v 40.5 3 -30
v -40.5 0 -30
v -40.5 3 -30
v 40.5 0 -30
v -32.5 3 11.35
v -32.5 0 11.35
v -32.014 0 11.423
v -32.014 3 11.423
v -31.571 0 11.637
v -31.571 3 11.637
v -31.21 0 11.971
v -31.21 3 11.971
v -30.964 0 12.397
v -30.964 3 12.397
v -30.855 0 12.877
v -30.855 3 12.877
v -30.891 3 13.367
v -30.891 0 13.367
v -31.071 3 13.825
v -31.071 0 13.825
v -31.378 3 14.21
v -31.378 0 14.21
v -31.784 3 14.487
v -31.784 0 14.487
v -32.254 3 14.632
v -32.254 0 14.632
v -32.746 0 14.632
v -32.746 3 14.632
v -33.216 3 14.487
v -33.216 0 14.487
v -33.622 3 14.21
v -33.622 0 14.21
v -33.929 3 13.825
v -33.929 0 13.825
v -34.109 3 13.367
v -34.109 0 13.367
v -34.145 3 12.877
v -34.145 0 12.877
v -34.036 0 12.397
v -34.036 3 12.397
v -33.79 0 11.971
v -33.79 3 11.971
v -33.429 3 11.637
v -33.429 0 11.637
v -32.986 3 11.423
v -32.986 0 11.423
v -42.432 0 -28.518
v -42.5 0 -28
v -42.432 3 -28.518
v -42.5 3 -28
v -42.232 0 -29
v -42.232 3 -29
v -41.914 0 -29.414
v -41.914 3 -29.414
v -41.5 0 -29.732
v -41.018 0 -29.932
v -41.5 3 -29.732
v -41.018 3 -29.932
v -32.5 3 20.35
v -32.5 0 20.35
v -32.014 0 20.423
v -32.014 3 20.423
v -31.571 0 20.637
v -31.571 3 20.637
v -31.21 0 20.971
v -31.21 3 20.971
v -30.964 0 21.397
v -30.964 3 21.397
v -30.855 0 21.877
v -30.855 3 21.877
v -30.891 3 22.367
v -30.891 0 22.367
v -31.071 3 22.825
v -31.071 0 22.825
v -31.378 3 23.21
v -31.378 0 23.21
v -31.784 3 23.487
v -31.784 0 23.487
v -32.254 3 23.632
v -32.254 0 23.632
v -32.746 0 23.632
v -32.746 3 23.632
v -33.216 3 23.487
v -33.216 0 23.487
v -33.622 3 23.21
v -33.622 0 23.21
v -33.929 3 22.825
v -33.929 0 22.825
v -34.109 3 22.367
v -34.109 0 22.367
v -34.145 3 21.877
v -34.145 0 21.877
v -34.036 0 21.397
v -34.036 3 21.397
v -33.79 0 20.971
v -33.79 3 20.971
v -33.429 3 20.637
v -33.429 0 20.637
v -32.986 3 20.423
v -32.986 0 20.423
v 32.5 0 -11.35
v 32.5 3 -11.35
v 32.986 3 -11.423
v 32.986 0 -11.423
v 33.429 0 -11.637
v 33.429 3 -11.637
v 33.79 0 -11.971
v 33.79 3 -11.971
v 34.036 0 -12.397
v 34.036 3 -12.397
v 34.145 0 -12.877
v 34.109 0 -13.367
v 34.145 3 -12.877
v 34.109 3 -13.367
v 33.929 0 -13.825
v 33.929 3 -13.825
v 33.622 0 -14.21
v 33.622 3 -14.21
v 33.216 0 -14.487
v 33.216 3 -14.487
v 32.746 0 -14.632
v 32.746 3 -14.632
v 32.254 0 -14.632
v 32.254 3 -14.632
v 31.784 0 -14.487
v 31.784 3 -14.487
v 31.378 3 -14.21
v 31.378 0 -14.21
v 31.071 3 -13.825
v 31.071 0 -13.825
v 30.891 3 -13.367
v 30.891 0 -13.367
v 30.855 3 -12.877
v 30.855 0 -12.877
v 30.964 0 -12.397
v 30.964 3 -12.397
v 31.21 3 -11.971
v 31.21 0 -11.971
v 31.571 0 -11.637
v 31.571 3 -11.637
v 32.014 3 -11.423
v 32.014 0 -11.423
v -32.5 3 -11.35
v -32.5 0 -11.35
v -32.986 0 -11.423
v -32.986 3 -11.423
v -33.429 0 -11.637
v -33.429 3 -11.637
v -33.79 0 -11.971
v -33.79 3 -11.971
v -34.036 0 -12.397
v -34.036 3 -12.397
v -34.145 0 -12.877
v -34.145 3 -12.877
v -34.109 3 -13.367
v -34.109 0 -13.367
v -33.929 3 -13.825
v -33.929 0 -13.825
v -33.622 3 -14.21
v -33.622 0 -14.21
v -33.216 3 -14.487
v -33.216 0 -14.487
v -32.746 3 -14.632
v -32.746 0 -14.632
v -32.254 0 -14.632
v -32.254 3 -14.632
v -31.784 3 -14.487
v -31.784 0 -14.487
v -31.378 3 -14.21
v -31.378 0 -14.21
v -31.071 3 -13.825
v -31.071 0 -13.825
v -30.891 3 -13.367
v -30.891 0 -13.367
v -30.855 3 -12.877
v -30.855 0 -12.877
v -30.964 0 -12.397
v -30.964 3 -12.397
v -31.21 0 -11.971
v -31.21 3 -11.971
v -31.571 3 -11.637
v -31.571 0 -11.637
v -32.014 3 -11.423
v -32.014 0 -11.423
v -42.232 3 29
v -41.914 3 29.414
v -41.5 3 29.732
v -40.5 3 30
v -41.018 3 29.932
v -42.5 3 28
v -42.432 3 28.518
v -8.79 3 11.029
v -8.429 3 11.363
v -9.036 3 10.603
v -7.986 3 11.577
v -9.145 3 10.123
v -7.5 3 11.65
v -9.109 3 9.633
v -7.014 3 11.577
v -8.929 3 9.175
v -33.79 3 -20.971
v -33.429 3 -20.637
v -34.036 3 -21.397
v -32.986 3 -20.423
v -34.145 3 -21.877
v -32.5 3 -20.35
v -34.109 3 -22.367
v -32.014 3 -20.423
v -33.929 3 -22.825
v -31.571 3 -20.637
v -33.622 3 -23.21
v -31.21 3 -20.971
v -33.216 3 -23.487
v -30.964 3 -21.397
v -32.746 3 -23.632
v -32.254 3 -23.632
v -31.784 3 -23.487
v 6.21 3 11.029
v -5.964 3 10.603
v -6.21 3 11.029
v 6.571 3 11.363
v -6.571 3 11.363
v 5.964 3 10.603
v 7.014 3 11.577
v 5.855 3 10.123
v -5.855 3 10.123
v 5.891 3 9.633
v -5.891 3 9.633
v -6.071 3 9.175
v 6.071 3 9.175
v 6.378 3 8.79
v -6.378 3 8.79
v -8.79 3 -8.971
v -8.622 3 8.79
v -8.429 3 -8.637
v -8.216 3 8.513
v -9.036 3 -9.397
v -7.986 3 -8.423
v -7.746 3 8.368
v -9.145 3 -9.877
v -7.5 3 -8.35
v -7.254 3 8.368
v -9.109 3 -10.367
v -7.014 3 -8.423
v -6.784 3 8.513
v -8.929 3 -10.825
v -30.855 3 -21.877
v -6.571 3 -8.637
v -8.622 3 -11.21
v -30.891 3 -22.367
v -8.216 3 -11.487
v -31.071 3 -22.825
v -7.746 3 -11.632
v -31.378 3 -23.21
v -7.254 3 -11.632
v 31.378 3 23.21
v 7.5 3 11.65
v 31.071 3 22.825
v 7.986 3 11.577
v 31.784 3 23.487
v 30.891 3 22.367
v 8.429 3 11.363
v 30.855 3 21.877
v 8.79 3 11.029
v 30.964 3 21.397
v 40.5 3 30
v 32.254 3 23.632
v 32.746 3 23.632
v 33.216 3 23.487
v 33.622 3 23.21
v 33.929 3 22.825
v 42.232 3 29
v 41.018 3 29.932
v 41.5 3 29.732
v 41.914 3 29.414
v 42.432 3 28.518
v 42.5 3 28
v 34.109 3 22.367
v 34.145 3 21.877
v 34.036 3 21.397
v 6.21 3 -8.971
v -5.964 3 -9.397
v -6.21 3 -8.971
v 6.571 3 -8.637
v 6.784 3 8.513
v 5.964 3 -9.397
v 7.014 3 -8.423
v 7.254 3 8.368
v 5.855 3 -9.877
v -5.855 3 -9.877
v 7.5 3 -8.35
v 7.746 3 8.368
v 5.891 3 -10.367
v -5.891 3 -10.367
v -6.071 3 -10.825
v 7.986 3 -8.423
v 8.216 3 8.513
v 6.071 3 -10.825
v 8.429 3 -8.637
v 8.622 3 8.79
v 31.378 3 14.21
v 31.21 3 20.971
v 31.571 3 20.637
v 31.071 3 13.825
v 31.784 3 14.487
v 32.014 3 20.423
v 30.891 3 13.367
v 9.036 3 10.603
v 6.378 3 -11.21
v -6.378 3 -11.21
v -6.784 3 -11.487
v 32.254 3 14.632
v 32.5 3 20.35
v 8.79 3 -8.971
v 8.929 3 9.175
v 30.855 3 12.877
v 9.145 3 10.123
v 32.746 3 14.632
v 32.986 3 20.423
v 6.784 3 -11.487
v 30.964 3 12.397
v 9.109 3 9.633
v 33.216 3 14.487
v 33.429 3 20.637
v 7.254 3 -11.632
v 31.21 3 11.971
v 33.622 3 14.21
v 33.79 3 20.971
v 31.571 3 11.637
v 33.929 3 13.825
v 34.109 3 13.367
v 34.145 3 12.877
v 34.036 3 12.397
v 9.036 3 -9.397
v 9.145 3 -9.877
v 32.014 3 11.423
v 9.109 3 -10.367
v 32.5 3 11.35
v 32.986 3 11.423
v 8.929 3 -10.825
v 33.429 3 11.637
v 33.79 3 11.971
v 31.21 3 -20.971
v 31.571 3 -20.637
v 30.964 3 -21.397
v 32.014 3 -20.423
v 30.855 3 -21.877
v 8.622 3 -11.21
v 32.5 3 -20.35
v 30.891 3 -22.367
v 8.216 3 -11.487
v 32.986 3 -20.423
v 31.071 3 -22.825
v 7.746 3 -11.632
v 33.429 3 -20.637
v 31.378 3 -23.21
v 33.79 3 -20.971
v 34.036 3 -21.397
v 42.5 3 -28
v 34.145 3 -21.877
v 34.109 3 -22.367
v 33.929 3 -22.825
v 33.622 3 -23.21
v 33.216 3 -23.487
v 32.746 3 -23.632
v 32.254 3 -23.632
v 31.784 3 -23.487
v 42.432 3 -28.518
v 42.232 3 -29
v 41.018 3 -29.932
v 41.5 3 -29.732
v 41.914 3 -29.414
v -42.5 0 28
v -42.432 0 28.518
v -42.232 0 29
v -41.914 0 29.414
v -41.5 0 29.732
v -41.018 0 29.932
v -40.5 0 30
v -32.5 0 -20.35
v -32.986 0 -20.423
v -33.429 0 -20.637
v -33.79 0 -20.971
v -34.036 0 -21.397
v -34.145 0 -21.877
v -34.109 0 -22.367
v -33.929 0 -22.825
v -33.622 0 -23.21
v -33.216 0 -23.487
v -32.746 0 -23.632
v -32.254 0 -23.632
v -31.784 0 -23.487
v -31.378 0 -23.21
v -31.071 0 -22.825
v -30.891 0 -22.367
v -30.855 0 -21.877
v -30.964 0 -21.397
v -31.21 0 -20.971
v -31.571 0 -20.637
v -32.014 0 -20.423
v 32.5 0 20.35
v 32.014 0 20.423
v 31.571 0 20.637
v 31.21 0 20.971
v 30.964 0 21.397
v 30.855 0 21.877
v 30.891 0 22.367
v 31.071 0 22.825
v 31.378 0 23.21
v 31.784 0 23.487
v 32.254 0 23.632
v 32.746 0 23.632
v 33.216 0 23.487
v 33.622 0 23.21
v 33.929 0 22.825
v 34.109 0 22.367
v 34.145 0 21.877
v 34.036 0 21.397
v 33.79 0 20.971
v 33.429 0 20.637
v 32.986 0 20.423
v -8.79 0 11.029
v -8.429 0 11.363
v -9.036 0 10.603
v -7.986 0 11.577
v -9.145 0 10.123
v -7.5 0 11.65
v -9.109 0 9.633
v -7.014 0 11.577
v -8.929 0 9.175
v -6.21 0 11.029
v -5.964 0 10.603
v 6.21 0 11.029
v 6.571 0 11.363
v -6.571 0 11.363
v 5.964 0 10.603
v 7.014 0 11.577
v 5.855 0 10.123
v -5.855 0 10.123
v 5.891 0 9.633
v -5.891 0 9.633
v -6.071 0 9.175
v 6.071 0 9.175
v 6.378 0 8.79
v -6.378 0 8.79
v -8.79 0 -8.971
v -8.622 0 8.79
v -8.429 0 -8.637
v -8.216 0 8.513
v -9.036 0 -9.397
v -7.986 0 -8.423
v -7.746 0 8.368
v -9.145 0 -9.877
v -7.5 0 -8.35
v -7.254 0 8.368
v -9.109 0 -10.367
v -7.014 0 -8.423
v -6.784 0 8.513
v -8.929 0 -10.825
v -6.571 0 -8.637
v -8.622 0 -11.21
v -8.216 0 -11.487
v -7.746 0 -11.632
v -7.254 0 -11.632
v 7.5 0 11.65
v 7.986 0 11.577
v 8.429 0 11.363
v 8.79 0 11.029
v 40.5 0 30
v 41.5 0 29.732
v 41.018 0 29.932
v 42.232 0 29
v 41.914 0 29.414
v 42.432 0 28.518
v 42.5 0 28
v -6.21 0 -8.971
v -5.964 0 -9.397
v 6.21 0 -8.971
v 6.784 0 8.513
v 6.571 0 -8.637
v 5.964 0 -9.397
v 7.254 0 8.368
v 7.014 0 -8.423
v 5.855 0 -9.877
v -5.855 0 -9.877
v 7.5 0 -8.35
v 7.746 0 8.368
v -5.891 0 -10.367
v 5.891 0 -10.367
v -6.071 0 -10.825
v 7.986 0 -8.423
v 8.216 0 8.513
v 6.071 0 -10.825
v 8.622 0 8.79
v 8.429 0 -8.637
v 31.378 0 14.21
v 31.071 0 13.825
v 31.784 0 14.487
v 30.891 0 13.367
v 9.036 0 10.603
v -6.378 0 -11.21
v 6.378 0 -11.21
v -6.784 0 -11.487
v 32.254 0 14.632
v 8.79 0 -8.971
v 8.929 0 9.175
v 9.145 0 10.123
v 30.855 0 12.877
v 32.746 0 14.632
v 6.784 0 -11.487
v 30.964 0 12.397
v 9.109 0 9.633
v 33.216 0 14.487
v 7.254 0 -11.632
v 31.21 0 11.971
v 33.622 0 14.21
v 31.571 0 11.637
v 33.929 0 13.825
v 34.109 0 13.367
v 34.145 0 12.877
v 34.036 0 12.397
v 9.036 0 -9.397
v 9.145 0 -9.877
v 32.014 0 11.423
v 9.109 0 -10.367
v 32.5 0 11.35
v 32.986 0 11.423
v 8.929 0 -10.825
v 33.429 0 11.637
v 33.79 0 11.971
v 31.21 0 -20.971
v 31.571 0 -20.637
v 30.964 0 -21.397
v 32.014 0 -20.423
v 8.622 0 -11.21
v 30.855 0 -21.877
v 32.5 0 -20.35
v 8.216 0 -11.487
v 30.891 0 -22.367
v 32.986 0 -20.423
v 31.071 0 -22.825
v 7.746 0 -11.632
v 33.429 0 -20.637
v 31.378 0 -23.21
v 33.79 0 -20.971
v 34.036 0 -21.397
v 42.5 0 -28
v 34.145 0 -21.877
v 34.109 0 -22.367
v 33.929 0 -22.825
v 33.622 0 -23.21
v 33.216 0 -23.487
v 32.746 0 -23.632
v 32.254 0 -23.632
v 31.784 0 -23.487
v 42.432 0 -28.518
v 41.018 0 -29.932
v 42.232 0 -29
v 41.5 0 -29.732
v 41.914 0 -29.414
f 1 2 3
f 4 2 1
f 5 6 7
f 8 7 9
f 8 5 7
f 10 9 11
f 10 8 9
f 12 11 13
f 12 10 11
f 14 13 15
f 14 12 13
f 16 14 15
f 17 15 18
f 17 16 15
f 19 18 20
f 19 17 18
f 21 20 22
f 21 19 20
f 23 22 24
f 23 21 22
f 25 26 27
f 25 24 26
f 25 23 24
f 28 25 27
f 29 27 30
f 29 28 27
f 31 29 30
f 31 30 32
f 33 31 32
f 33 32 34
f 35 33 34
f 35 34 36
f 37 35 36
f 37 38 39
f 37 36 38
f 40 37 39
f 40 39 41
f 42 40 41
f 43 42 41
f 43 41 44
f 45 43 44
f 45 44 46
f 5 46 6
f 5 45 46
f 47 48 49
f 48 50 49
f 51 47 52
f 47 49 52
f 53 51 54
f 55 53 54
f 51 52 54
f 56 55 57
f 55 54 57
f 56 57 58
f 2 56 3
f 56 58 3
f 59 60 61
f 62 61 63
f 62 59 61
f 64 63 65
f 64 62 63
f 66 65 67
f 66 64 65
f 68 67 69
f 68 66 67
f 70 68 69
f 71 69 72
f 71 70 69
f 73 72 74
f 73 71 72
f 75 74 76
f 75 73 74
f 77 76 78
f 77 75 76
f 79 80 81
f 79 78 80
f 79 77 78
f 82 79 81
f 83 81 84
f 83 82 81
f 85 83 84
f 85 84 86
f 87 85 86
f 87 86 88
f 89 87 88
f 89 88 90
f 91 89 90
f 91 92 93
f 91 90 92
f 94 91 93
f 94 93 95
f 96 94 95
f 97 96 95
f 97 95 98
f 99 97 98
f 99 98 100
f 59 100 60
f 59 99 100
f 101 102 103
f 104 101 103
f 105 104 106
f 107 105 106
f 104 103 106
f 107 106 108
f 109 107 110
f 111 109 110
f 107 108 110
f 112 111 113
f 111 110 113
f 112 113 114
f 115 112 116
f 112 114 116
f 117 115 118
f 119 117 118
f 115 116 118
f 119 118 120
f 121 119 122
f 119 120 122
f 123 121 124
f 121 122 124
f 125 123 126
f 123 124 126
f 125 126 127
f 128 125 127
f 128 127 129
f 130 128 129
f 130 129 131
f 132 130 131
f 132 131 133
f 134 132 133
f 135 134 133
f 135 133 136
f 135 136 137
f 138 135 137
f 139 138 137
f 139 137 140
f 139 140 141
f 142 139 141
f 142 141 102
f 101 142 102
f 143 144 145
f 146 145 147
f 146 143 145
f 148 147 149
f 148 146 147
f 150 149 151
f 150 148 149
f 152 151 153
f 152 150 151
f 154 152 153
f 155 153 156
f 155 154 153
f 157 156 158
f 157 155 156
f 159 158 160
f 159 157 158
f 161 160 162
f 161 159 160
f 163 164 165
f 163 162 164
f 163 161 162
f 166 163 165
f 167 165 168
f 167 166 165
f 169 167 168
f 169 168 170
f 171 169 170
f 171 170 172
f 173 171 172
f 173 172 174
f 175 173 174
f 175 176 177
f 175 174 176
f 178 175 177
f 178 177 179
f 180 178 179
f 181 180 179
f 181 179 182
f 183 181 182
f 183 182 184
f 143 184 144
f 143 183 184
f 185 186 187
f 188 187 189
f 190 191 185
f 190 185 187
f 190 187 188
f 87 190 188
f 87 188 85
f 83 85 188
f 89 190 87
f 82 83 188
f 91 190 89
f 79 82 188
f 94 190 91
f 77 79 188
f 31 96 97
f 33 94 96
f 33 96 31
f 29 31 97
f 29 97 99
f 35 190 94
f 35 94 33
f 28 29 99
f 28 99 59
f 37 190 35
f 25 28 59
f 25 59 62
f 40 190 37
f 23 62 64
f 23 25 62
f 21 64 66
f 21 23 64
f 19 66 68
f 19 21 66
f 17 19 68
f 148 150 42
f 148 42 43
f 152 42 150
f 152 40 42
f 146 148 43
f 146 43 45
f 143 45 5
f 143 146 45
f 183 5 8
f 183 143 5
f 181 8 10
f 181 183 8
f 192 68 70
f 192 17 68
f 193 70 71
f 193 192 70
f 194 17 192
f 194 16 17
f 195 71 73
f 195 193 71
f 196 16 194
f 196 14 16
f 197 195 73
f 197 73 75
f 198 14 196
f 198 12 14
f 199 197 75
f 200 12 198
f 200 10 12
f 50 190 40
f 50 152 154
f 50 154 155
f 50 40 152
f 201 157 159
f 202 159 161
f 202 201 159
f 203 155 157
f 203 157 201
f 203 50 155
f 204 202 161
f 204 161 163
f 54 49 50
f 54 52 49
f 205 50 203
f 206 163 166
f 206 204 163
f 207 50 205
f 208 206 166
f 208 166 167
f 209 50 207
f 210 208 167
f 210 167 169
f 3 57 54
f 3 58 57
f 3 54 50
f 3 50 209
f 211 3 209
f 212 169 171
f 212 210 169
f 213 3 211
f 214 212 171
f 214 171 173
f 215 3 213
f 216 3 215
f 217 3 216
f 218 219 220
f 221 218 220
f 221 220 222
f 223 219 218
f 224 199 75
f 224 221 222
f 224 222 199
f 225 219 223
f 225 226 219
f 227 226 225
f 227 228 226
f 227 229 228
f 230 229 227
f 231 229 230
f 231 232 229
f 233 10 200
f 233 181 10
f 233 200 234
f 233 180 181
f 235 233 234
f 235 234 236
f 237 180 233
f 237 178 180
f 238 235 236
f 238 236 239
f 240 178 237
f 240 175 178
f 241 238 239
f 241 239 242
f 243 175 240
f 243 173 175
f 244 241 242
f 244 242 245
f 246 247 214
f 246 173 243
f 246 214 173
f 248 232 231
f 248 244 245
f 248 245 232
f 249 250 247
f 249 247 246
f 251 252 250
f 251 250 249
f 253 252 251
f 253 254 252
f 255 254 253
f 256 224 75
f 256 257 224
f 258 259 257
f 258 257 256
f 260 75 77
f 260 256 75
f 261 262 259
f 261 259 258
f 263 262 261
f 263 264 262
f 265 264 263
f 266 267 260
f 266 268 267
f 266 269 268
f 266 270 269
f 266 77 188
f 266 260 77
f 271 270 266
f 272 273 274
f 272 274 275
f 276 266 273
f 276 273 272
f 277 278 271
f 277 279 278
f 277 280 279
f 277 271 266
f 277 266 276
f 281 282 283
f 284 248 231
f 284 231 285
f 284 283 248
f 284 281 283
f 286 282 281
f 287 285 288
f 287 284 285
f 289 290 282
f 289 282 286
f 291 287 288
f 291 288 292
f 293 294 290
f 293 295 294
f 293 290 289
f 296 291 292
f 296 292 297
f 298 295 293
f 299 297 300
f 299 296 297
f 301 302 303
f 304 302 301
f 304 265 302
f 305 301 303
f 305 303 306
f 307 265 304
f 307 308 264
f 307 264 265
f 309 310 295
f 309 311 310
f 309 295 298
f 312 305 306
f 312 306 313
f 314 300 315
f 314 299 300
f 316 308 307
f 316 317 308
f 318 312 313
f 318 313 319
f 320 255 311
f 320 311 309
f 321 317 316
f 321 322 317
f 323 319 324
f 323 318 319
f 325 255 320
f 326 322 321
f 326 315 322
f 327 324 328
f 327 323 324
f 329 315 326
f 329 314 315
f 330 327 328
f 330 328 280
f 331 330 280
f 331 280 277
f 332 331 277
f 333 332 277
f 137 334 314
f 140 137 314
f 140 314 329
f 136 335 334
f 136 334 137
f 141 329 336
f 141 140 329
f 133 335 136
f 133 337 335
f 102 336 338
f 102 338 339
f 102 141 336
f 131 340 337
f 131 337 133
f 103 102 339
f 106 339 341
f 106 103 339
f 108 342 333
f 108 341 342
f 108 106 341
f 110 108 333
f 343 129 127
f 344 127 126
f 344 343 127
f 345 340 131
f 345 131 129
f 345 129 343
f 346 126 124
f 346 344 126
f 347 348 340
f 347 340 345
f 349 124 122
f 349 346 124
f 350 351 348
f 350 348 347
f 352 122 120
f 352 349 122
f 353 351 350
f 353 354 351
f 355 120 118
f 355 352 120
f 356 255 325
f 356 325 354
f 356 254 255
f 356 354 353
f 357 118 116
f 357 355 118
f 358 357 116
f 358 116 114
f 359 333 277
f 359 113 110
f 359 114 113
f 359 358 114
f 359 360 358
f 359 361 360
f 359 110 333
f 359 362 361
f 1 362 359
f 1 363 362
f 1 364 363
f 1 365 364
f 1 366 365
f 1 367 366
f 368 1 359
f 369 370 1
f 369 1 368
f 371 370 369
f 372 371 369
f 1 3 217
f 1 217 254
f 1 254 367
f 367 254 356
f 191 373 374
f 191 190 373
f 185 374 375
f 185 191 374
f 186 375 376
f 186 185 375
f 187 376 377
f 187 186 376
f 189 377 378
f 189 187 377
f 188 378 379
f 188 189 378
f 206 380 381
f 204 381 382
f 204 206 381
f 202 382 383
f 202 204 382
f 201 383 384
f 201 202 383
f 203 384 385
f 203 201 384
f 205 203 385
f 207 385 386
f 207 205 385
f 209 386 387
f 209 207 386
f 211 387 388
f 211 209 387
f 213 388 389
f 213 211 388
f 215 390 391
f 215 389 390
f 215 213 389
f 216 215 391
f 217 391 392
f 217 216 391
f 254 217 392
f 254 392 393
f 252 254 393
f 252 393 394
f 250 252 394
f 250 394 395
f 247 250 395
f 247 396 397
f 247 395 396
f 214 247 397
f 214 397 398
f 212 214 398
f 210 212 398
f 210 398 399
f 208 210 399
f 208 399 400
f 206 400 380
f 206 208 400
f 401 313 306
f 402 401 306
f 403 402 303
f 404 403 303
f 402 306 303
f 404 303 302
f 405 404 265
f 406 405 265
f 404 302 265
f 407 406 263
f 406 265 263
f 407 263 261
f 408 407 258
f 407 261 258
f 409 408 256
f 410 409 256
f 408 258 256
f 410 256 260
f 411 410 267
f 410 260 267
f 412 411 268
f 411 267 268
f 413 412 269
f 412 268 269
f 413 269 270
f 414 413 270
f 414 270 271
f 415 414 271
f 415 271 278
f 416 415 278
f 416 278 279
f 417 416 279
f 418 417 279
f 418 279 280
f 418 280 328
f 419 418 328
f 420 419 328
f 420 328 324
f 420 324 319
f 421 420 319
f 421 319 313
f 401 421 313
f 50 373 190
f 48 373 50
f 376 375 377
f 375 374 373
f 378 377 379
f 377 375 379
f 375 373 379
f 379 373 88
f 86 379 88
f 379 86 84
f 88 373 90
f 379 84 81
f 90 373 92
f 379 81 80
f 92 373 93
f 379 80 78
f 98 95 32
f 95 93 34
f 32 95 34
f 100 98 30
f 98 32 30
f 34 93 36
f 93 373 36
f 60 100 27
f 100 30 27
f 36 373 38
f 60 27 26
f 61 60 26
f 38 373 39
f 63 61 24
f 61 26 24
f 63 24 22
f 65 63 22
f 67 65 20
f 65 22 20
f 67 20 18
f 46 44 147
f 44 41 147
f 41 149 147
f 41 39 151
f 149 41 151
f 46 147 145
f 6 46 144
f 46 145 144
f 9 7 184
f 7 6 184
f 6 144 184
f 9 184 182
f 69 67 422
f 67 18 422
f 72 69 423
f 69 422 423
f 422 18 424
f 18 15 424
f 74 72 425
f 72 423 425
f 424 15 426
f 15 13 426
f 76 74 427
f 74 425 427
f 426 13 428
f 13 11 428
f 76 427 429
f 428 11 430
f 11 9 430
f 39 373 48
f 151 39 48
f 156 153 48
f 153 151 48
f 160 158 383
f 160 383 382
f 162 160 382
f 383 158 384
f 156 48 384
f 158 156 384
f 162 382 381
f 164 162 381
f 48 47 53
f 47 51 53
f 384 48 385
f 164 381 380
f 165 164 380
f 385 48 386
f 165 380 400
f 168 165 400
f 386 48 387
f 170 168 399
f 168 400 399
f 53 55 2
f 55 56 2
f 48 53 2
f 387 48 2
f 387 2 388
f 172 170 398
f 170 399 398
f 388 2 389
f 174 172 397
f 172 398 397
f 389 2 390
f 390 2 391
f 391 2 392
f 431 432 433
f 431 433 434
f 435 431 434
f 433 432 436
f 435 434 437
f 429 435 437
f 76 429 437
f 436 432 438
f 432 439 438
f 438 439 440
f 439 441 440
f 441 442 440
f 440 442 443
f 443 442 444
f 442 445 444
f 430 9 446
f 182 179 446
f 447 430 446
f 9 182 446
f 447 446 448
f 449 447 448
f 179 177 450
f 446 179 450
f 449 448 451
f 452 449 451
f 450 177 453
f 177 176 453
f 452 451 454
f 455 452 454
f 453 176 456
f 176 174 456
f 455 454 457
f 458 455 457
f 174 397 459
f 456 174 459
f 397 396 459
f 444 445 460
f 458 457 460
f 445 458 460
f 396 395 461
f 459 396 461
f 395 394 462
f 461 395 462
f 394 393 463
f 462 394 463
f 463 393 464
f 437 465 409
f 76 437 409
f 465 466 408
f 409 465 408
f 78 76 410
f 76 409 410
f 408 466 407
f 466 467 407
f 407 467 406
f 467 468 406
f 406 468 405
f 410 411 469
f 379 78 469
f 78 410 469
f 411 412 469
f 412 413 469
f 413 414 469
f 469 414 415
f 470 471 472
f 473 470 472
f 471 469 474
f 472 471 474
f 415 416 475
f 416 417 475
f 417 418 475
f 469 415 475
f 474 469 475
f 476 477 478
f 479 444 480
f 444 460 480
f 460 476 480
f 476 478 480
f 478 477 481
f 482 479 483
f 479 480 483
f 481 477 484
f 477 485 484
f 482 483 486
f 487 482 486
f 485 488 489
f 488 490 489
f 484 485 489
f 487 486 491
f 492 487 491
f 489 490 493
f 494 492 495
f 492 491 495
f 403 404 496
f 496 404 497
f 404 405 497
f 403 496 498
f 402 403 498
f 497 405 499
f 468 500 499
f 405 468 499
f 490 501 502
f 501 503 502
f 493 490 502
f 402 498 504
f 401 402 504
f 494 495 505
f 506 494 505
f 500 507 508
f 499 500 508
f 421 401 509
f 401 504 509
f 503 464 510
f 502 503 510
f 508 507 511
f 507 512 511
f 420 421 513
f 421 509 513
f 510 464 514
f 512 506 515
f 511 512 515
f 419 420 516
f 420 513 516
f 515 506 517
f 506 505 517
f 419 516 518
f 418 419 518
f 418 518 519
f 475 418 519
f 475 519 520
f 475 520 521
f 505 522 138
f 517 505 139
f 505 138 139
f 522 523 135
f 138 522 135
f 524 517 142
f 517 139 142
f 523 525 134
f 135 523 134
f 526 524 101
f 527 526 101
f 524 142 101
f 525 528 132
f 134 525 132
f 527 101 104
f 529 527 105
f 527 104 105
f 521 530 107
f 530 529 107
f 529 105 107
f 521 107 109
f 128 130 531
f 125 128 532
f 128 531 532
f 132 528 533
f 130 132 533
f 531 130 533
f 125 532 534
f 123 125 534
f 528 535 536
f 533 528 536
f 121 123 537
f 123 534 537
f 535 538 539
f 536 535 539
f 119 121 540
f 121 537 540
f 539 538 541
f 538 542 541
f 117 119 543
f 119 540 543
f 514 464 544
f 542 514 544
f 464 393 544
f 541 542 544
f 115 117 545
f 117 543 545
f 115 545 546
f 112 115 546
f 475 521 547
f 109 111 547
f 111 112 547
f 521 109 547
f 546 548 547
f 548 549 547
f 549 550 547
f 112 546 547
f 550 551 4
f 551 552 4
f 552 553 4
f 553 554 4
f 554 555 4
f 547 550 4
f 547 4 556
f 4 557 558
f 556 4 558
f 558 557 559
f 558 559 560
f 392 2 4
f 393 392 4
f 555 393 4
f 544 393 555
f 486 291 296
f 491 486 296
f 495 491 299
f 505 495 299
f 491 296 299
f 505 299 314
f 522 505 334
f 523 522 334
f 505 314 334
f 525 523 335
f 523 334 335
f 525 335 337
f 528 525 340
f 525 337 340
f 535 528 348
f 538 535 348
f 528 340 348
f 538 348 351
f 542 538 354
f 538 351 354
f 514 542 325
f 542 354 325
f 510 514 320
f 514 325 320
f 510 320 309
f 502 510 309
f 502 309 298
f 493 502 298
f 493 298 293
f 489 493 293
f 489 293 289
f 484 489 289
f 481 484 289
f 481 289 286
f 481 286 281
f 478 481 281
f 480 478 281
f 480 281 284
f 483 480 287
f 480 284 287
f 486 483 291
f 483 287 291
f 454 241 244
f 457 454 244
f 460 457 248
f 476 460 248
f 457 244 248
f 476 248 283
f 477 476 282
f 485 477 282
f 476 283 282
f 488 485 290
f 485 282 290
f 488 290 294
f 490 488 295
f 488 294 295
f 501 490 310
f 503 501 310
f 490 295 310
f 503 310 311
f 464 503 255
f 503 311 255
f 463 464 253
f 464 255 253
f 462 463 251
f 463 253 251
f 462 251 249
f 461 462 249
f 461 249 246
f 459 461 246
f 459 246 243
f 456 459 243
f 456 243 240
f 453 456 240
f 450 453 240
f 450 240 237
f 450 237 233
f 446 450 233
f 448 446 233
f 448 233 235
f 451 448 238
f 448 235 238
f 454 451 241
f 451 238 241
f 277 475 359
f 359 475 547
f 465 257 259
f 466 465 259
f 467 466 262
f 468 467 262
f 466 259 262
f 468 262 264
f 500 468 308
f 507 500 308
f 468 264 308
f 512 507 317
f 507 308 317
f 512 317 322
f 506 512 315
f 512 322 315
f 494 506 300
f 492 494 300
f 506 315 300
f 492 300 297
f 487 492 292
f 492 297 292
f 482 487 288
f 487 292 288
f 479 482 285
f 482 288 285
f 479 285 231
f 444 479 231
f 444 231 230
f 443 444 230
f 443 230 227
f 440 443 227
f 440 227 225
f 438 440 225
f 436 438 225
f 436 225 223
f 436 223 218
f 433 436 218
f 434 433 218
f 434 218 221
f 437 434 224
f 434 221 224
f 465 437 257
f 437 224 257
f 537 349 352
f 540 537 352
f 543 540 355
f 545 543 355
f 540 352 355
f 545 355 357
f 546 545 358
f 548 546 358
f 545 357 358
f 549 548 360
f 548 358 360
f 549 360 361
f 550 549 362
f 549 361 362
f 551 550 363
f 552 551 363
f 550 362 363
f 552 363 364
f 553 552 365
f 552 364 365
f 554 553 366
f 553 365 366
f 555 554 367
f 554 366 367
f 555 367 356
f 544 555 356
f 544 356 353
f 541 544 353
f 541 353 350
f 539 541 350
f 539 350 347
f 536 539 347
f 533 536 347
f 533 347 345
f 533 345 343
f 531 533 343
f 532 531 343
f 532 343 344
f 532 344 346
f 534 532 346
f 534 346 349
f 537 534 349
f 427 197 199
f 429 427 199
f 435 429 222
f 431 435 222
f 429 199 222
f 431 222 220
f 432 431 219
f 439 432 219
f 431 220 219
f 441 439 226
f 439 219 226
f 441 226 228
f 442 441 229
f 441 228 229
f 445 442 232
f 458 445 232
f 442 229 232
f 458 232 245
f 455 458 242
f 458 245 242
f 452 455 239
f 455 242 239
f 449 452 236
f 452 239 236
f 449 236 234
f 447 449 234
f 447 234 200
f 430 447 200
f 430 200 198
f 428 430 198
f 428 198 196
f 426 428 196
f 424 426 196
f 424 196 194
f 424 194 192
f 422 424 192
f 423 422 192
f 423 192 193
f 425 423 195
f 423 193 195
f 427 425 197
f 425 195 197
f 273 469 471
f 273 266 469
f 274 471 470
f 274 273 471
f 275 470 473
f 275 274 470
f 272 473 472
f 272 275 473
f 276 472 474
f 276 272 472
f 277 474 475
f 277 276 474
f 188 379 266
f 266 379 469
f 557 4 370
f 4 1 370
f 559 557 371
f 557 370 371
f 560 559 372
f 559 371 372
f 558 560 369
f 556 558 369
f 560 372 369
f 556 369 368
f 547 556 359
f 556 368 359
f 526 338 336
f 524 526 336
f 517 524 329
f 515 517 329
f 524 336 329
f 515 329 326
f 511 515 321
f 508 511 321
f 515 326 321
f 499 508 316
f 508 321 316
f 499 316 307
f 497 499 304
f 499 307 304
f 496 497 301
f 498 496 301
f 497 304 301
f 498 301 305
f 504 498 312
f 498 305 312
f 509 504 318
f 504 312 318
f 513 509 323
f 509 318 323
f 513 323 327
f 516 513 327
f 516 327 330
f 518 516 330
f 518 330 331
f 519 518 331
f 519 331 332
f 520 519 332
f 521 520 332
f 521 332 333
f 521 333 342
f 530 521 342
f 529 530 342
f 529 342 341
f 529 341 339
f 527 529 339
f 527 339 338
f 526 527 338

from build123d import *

# Parameters (mm, degrees)
SKETCH_1_W          = 85
SKETCH_1_H          = 60
EXTRUDE_1_DEPTH     = 3
SKETCH_2_R          = 1.65
CUT_EXTRUDE_1_DEPTH = 3
SKETCH_3_R          = 1.65
CUT_EXTRUDE_2_DEPTH = 100
FILLET_1_R          = 2


with BuildPart() as part:
    # 草图1 → 凸台-拉伸1 (new body)
    with BuildSketch(Plane(origin=(0, 0, 0), x_dir=(1, 0, 0), z_dir=(0, 1, 0))):
        Rectangle(SKETCH_1_W, SKETCH_1_H)
    extrude(amount=EXTRUDE_1_DEPTH)

    # 草图2 → 切除-拉伸1 (cut)
    with BuildSketch(Plane(origin=(0, 3, 0), x_dir=(1, 0, 0), z_dir=(0, 1, 0))):
        with Locations(Location((7.5, 10, 0), (0, 0, 270))):
            Circle(SKETCH_2_R)
        with Locations(Location((-7.5, 10, 0), (0, 0, 270))):
            Circle(SKETCH_2_R)
        with Locations(Location((-7.5, -10, 0), (0, 0, 270))):
            Circle(SKETCH_2_R)
        with Locations(Location((7.5, -10, 0), (0, 0, 270))):
            Circle(SKETCH_2_R)
    extrude(amount=-CUT_EXTRUDE_1_DEPTH, mode=Mode.SUBTRACT)

    # 草图3 → 切除-拉伸2 (cut)
    with BuildSketch(Plane(origin=(0, 3, 0), x_dir=(1, 0, 0), z_dir=(0, 1, 0))):
        with Locations(Location((32.5, 13, 0), (0, 0, 270))):
            Circle(SKETCH_3_R)
        with Locations(Location((32.5, 22, 0), (0, 0, 270))):
            Circle(SKETCH_3_R)
        with Locations(Location((32.5, -13, 0), (0, 0, 90))):
            Circle(SKETCH_3_R)
        with Locations(Location((32.5, -22, 0), (0, 0, 90))):
            Circle(SKETCH_3_R)
    cut_extrude_2 = extrude(amount=-CUT_EXTRUDE_2_DEPTH, mode=Mode.SUBTRACT)

    # 镜向1: 切除-拉伸2 across plane
    add(cut_extrude_2.mirror(Plane(origin=(0, 0, 0), x_dir=(0, 0, 1), z_dir=(1, 0, 0))), mode=Mode.SUBTRACT)

    # 圆角1
    fillet_1_edges = [part.edges().sort_by_distance(p)[0] for p in [
        (42.5, 1.5, 30),
        (-42.5, 1.5, 30),
        (-42.5, 1.5, -30),
        (42.5, 1.5, -30),
    ]]
    fillet(fillet_1_edges, radius=FILLET_1_R)


solid = part.part
